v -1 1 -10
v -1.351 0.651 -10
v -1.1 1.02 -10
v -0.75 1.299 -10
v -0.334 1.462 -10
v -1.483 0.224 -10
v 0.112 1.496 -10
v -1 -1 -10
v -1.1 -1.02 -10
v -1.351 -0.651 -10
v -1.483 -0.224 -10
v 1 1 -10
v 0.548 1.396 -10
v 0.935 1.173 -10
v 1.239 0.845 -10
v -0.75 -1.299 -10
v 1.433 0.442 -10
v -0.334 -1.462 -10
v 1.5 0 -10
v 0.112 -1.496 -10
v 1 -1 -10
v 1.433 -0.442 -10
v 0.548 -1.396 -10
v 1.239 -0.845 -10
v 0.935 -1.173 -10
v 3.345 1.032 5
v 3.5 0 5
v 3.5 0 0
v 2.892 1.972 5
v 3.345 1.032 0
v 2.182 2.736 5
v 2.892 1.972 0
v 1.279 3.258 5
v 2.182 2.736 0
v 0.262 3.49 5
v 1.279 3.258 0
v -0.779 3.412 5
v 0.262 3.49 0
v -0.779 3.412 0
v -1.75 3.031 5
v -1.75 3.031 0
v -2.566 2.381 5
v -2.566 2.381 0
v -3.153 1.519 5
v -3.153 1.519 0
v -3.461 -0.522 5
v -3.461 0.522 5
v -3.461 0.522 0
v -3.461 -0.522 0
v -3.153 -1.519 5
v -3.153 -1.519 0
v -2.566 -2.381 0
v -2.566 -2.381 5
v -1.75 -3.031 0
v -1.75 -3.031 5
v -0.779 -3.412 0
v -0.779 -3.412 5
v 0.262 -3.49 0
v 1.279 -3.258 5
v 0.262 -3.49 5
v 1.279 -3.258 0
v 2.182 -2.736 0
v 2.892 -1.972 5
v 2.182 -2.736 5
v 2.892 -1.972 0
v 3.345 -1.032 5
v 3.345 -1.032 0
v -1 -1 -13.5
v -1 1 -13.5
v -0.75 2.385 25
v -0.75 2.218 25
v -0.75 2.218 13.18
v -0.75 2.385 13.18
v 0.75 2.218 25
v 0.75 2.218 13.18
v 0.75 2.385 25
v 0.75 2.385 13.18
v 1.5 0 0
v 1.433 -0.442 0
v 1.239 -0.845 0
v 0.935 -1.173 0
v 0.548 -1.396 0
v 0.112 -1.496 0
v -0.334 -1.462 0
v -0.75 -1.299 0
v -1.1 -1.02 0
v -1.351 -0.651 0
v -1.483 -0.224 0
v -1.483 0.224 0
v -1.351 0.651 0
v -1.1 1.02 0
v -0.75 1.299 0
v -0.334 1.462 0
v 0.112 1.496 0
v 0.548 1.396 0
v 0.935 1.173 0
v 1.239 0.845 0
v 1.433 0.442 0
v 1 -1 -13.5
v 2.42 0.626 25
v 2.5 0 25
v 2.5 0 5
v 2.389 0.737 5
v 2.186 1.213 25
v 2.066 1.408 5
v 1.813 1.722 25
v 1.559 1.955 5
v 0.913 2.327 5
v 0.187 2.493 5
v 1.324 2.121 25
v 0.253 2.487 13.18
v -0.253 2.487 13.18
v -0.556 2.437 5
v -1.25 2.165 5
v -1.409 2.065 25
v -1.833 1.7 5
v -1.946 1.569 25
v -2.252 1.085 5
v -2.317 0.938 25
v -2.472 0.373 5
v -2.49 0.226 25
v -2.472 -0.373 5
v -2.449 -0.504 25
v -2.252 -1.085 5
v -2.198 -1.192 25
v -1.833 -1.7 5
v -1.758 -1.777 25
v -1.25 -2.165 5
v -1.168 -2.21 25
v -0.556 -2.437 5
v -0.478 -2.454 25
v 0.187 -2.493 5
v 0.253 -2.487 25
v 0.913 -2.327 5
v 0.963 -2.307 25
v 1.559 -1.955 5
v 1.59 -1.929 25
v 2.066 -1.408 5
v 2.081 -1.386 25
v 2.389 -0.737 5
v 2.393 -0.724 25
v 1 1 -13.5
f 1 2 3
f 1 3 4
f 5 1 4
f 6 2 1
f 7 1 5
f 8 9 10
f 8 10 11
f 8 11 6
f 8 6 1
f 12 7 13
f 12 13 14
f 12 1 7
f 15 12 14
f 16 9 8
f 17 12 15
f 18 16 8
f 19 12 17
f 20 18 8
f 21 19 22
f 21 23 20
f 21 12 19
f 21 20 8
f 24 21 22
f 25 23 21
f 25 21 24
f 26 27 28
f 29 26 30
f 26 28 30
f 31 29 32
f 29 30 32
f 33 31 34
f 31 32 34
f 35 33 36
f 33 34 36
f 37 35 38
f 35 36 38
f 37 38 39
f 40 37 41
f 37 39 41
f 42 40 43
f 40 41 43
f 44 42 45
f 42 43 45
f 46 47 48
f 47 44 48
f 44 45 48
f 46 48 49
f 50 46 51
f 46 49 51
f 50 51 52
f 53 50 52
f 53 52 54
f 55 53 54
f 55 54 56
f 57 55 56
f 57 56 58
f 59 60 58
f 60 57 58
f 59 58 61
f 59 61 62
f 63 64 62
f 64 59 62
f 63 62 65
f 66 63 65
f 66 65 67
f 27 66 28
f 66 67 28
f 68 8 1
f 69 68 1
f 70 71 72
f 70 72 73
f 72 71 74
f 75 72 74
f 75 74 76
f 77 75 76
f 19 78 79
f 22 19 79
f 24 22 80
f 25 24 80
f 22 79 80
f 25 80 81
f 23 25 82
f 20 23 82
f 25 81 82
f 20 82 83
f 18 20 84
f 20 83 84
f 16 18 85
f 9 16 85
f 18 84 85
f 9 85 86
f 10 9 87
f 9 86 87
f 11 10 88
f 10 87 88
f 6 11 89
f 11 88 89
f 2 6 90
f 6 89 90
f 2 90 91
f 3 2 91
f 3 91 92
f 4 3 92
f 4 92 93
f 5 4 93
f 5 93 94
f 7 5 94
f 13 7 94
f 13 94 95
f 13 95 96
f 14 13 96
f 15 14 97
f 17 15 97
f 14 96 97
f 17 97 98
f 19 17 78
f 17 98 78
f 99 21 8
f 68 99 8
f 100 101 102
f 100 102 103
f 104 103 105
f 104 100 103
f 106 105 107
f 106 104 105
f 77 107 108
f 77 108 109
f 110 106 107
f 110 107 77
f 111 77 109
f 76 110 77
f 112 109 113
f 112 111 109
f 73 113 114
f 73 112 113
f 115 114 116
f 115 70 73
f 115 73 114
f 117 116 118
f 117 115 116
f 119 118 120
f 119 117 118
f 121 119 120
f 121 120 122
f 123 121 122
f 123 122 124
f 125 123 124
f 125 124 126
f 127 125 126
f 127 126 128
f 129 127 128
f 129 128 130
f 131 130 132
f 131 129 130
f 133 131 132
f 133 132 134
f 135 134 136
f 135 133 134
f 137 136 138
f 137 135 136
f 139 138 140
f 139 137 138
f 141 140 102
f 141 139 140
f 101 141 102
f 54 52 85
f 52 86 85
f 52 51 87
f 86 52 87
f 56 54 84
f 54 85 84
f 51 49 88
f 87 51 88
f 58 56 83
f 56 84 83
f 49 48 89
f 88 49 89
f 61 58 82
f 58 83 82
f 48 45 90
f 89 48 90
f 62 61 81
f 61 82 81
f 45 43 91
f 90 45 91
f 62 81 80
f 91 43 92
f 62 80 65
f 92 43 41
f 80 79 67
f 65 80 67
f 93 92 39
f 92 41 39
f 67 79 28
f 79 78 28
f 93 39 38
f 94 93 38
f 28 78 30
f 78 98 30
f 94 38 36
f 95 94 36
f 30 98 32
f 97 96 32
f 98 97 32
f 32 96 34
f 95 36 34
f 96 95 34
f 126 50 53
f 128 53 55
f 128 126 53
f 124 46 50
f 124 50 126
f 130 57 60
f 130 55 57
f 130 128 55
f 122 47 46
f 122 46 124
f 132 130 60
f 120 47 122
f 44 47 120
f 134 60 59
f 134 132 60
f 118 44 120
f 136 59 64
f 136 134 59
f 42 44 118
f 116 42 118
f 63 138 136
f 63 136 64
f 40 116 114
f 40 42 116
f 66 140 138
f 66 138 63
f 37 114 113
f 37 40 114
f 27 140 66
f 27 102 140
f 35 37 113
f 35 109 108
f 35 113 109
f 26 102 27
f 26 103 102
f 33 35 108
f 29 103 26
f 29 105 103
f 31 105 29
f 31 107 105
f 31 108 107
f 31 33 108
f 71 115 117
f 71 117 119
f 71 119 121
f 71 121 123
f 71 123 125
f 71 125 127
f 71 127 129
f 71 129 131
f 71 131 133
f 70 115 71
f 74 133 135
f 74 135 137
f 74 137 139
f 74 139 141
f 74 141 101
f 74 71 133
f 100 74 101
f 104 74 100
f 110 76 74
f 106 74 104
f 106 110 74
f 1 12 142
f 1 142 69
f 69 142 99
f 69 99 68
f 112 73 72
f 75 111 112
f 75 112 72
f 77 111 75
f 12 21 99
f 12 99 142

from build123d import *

# Parameters (mm, degrees)
SKETCH_1_R          = 3.5
EXTRUDE_1_DEPTH     = 25
SKETCH_2_R          = 1.5
EXTRUDE_2_DEPTH     = 10
SKETCH_3_W          = 2
SKETCH_3_H          = 2
EXTRUDE_3_DEPTH     = 3.5
SKETCH_4_OUTSIDE_W  = 16.95
SKETCH_4_OUTSIDE_H  = 16.95
SKETCH_4_OUTSIDE_R  = 2.5
CUT_EXTRUDE_1_DEPTH = 20
SKETCH_5_W          = 1.5
SKETCH_5_H          = 0.547111854
CUT_EXTRUDE_2_DEPTH = 11.820119966


with BuildPart() as part:
    # 草图1 → 拉伸1 (new body)
    with BuildSketch(Plane.XY):
        Circle(SKETCH_1_R)
    extrude(amount=EXTRUDE_1_DEPTH)

    # 草图2 → 拉伸2 (add)
    with BuildSketch(Plane(origin=(0, 0, 0), x_dir=(-1, 0, 0), z_dir=(0, 0, -1))):
        with Locations(Location((0, 0, 0), (0, 0, 180))):
            Circle(SKETCH_2_R)
    extrude(amount=EXTRUDE_2_DEPTH)

    # 草图3 → 拉伸3 (add)
    with BuildSketch(Plane(origin=(0, 0, -10), x_dir=(-1, 0, 0), z_dir=(0, 0, -1))):
        Rectangle(SKETCH_3_W, SKETCH_3_H)
    extrude(amount=EXTRUDE_3_DEPTH)

    # 草图4 outside → 切除-拉伸1 (cut)
    with BuildSketch(Plane.XY.offset(25)):
        Rectangle(SKETCH_4_OUTSIDE_W, SKETCH_4_OUTSIDE_H)
        Circle(SKETCH_4_OUTSIDE_R, mode=Mode.SUBTRACT)
    extrude(amount=-CUT_EXTRUDE_1_DEPTH, mode=Mode.SUBTRACT)

    # 草图5 → 切除-拉伸2 (cut)
    with BuildSketch(Plane.XY.offset(25)):
        with Locations((0, 2.491129658)):
            Rectangle(SKETCH_5_W, SKETCH_5_H)
    extrude(amount=-CUT_EXTRUDE_2_DEPTH, mode=Mode.SUBTRACT)


solid = part.part
